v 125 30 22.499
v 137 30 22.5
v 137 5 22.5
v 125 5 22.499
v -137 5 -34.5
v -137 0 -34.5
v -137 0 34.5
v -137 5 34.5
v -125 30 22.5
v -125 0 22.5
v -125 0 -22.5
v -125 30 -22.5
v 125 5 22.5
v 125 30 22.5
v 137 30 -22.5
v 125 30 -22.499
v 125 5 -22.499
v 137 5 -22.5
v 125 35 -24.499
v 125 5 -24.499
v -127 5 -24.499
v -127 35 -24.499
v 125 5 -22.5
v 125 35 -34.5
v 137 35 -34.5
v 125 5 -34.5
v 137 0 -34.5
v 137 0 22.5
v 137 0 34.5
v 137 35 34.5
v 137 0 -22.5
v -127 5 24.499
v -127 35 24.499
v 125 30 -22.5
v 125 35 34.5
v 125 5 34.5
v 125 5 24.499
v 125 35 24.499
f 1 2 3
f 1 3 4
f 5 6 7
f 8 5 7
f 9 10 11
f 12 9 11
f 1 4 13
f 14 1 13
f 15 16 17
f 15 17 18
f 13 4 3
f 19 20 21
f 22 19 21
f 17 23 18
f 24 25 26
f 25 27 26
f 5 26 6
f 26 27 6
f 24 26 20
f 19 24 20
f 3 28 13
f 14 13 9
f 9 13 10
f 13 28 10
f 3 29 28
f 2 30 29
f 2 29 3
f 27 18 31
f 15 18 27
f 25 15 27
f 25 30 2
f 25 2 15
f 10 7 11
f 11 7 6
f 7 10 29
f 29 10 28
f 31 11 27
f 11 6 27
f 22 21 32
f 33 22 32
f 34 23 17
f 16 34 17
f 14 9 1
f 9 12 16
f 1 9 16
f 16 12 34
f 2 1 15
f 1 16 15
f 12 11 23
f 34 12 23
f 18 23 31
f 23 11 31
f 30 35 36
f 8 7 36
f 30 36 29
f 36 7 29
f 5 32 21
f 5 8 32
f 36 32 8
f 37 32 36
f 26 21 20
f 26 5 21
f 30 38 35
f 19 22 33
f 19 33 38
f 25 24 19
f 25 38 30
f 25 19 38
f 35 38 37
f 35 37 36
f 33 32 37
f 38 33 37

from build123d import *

# Parameters (mm, degrees)
BOSS_EXTRUDE1_DEPTH = 5
BOSS_EXTRUDE2_DEPTH = 30
SKETCH4_W           = 262
SKETCH4_H           = 45
BOSS_EXTRUDE3_DEPTH = 5


with BuildPart() as part:
    # Sketch1 → Boss-Extrude1 (new body)
    with BuildSketch(Plane(origin=(0, 0, 0), x_dir=(1, 0, 0), z_dir=(0, 1, 0))):
        Polygon((137, -22.5), (125, -22.5), (-125, -22.5), (-125, 22.5), (125, 22.5), (137, 22.5), (137, 34.5), (-137, 34.5), (-137, -34.5), (137, -34.5), align=None)
    extrude(amount=BOSS_EXTRUDE1_DEPTH)

    # Sketch2 → Boss-Extrude2 (add)
    with BuildSketch(Plane(origin=(0, 5, 0), x_dir=(1, 0, 0), z_dir=(0, 1, 0))):
        Polygon((125, 22.5), (125, 22.499356702), (137, 22.5), (137, 34.5), (125, 34.5), (125, 24.499356702), (-127, 24.499356702), (-127, -24.499356702), (125, -24.499356702), (125, -34.5), (137, -34.5), (137, -22.5), (125, -22.499356702), (125, -22.5), (-125, -22.5), (-125, 22.5), align=None)
    extrude(amount=BOSS_EXTRUDE2_DEPTH)

    # Sketch4 → Boss-Extrude3 (add)
    with BuildSketch(Plane(origin=(0, 35, 0), x_dir=(1, 0, 0), z_dir=(0, 1, 0))):
        with Locations((6, 0)):
            Rectangle(SKETCH4_W, SKETCH4_H)
    extrude(amount=-BOSS_EXTRUDE3_DEPTH)


solid = part.part
